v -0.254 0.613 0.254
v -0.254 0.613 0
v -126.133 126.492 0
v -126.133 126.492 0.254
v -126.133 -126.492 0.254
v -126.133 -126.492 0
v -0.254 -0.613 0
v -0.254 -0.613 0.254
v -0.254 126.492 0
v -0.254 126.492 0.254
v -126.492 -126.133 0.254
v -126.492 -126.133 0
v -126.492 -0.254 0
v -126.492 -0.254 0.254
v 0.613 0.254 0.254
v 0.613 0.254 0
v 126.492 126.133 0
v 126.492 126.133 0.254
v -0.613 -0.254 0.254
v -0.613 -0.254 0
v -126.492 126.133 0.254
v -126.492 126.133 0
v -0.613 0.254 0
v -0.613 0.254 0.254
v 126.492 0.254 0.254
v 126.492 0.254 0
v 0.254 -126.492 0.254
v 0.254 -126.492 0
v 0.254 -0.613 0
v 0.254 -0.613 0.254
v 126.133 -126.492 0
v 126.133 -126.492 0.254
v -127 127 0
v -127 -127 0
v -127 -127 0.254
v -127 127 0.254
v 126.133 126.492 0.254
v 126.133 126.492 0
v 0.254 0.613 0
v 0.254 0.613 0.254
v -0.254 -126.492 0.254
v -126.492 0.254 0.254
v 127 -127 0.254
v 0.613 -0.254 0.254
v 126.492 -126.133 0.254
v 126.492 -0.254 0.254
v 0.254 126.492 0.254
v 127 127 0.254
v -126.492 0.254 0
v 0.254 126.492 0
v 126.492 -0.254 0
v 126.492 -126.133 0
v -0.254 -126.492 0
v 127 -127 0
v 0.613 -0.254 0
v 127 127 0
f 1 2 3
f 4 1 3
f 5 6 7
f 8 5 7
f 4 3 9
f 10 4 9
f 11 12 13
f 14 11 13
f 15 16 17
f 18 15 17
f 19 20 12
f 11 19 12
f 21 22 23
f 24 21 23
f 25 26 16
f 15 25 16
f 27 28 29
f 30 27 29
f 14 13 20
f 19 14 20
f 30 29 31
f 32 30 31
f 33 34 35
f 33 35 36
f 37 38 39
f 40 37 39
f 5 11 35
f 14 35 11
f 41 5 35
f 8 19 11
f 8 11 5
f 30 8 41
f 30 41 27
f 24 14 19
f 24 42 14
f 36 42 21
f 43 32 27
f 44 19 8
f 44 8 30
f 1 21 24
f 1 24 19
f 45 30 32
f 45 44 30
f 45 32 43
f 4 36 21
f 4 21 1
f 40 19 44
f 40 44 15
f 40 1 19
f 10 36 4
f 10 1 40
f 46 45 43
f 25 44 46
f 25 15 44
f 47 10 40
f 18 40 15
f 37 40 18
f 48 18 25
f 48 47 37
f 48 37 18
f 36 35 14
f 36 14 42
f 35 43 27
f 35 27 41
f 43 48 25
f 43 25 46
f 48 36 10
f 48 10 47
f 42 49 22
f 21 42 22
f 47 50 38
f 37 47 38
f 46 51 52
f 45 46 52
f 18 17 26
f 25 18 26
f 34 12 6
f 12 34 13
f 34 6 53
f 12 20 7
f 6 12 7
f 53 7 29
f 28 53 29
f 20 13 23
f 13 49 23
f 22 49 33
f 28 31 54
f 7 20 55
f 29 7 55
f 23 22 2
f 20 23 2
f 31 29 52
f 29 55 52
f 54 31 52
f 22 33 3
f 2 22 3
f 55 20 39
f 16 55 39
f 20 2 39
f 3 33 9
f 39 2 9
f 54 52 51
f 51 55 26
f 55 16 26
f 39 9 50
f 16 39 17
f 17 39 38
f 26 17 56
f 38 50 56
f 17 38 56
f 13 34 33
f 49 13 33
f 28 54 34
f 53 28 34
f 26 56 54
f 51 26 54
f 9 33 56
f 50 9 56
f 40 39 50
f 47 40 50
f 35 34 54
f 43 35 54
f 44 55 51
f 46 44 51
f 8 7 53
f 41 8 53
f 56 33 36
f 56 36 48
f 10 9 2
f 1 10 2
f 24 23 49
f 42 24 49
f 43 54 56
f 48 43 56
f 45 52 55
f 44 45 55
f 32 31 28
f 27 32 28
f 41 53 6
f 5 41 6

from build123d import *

# Parameters (mm, degrees)
F1_W     = 254
F1_H     = 254
F2_DEPTH = 0.254


with BuildPart() as f2:
    # F1 (on Top) → F2 (new body)
    with BuildSketch(Plane.XY):
        Rectangle(F1_W, F1_H)
        Polygon((-0.254, -126.492), (-126.13279, -126.492), (-0.254, -0.61321), align=None, mode=Mode.SUBTRACT)
        Polygon((-0.61321, -0.254), (-126.492, -126.13279), (-126.492, -0.254), align=None, mode=Mode.SUBTRACT)
        Polygon((126.13279, -126.492), (0.254, -126.492), (0.254, -0.61321), align=None, mode=Mode.SUBTRACT)
        Polygon((126.492, -0.254), (126.492, -126.13279), (0.61321, -0.254), align=None, mode=Mode.SUBTRACT)
        Polygon((-126.492, 0.254), (-126.492, 126.13279), (-0.61321, 0.254), align=None, mode=Mode.SUBTRACT)
        Polygon((-0.254, 0.61321), (-126.13279, 126.492), (-0.254, 126.492), align=None, mode=Mode.SUBTRACT)
        Polygon((0.61321, 0.254), (126.492, 126.13279), (126.492, 0.254), align=None, mode=Mode.SUBTRACT)
        Polygon((0.254, 0.61321), (0.254, 126.492), (126.13279, 126.492), align=None, mode=Mode.SUBTRACT)
    extrude(amount=F2_DEPTH)


solid = f2.part
